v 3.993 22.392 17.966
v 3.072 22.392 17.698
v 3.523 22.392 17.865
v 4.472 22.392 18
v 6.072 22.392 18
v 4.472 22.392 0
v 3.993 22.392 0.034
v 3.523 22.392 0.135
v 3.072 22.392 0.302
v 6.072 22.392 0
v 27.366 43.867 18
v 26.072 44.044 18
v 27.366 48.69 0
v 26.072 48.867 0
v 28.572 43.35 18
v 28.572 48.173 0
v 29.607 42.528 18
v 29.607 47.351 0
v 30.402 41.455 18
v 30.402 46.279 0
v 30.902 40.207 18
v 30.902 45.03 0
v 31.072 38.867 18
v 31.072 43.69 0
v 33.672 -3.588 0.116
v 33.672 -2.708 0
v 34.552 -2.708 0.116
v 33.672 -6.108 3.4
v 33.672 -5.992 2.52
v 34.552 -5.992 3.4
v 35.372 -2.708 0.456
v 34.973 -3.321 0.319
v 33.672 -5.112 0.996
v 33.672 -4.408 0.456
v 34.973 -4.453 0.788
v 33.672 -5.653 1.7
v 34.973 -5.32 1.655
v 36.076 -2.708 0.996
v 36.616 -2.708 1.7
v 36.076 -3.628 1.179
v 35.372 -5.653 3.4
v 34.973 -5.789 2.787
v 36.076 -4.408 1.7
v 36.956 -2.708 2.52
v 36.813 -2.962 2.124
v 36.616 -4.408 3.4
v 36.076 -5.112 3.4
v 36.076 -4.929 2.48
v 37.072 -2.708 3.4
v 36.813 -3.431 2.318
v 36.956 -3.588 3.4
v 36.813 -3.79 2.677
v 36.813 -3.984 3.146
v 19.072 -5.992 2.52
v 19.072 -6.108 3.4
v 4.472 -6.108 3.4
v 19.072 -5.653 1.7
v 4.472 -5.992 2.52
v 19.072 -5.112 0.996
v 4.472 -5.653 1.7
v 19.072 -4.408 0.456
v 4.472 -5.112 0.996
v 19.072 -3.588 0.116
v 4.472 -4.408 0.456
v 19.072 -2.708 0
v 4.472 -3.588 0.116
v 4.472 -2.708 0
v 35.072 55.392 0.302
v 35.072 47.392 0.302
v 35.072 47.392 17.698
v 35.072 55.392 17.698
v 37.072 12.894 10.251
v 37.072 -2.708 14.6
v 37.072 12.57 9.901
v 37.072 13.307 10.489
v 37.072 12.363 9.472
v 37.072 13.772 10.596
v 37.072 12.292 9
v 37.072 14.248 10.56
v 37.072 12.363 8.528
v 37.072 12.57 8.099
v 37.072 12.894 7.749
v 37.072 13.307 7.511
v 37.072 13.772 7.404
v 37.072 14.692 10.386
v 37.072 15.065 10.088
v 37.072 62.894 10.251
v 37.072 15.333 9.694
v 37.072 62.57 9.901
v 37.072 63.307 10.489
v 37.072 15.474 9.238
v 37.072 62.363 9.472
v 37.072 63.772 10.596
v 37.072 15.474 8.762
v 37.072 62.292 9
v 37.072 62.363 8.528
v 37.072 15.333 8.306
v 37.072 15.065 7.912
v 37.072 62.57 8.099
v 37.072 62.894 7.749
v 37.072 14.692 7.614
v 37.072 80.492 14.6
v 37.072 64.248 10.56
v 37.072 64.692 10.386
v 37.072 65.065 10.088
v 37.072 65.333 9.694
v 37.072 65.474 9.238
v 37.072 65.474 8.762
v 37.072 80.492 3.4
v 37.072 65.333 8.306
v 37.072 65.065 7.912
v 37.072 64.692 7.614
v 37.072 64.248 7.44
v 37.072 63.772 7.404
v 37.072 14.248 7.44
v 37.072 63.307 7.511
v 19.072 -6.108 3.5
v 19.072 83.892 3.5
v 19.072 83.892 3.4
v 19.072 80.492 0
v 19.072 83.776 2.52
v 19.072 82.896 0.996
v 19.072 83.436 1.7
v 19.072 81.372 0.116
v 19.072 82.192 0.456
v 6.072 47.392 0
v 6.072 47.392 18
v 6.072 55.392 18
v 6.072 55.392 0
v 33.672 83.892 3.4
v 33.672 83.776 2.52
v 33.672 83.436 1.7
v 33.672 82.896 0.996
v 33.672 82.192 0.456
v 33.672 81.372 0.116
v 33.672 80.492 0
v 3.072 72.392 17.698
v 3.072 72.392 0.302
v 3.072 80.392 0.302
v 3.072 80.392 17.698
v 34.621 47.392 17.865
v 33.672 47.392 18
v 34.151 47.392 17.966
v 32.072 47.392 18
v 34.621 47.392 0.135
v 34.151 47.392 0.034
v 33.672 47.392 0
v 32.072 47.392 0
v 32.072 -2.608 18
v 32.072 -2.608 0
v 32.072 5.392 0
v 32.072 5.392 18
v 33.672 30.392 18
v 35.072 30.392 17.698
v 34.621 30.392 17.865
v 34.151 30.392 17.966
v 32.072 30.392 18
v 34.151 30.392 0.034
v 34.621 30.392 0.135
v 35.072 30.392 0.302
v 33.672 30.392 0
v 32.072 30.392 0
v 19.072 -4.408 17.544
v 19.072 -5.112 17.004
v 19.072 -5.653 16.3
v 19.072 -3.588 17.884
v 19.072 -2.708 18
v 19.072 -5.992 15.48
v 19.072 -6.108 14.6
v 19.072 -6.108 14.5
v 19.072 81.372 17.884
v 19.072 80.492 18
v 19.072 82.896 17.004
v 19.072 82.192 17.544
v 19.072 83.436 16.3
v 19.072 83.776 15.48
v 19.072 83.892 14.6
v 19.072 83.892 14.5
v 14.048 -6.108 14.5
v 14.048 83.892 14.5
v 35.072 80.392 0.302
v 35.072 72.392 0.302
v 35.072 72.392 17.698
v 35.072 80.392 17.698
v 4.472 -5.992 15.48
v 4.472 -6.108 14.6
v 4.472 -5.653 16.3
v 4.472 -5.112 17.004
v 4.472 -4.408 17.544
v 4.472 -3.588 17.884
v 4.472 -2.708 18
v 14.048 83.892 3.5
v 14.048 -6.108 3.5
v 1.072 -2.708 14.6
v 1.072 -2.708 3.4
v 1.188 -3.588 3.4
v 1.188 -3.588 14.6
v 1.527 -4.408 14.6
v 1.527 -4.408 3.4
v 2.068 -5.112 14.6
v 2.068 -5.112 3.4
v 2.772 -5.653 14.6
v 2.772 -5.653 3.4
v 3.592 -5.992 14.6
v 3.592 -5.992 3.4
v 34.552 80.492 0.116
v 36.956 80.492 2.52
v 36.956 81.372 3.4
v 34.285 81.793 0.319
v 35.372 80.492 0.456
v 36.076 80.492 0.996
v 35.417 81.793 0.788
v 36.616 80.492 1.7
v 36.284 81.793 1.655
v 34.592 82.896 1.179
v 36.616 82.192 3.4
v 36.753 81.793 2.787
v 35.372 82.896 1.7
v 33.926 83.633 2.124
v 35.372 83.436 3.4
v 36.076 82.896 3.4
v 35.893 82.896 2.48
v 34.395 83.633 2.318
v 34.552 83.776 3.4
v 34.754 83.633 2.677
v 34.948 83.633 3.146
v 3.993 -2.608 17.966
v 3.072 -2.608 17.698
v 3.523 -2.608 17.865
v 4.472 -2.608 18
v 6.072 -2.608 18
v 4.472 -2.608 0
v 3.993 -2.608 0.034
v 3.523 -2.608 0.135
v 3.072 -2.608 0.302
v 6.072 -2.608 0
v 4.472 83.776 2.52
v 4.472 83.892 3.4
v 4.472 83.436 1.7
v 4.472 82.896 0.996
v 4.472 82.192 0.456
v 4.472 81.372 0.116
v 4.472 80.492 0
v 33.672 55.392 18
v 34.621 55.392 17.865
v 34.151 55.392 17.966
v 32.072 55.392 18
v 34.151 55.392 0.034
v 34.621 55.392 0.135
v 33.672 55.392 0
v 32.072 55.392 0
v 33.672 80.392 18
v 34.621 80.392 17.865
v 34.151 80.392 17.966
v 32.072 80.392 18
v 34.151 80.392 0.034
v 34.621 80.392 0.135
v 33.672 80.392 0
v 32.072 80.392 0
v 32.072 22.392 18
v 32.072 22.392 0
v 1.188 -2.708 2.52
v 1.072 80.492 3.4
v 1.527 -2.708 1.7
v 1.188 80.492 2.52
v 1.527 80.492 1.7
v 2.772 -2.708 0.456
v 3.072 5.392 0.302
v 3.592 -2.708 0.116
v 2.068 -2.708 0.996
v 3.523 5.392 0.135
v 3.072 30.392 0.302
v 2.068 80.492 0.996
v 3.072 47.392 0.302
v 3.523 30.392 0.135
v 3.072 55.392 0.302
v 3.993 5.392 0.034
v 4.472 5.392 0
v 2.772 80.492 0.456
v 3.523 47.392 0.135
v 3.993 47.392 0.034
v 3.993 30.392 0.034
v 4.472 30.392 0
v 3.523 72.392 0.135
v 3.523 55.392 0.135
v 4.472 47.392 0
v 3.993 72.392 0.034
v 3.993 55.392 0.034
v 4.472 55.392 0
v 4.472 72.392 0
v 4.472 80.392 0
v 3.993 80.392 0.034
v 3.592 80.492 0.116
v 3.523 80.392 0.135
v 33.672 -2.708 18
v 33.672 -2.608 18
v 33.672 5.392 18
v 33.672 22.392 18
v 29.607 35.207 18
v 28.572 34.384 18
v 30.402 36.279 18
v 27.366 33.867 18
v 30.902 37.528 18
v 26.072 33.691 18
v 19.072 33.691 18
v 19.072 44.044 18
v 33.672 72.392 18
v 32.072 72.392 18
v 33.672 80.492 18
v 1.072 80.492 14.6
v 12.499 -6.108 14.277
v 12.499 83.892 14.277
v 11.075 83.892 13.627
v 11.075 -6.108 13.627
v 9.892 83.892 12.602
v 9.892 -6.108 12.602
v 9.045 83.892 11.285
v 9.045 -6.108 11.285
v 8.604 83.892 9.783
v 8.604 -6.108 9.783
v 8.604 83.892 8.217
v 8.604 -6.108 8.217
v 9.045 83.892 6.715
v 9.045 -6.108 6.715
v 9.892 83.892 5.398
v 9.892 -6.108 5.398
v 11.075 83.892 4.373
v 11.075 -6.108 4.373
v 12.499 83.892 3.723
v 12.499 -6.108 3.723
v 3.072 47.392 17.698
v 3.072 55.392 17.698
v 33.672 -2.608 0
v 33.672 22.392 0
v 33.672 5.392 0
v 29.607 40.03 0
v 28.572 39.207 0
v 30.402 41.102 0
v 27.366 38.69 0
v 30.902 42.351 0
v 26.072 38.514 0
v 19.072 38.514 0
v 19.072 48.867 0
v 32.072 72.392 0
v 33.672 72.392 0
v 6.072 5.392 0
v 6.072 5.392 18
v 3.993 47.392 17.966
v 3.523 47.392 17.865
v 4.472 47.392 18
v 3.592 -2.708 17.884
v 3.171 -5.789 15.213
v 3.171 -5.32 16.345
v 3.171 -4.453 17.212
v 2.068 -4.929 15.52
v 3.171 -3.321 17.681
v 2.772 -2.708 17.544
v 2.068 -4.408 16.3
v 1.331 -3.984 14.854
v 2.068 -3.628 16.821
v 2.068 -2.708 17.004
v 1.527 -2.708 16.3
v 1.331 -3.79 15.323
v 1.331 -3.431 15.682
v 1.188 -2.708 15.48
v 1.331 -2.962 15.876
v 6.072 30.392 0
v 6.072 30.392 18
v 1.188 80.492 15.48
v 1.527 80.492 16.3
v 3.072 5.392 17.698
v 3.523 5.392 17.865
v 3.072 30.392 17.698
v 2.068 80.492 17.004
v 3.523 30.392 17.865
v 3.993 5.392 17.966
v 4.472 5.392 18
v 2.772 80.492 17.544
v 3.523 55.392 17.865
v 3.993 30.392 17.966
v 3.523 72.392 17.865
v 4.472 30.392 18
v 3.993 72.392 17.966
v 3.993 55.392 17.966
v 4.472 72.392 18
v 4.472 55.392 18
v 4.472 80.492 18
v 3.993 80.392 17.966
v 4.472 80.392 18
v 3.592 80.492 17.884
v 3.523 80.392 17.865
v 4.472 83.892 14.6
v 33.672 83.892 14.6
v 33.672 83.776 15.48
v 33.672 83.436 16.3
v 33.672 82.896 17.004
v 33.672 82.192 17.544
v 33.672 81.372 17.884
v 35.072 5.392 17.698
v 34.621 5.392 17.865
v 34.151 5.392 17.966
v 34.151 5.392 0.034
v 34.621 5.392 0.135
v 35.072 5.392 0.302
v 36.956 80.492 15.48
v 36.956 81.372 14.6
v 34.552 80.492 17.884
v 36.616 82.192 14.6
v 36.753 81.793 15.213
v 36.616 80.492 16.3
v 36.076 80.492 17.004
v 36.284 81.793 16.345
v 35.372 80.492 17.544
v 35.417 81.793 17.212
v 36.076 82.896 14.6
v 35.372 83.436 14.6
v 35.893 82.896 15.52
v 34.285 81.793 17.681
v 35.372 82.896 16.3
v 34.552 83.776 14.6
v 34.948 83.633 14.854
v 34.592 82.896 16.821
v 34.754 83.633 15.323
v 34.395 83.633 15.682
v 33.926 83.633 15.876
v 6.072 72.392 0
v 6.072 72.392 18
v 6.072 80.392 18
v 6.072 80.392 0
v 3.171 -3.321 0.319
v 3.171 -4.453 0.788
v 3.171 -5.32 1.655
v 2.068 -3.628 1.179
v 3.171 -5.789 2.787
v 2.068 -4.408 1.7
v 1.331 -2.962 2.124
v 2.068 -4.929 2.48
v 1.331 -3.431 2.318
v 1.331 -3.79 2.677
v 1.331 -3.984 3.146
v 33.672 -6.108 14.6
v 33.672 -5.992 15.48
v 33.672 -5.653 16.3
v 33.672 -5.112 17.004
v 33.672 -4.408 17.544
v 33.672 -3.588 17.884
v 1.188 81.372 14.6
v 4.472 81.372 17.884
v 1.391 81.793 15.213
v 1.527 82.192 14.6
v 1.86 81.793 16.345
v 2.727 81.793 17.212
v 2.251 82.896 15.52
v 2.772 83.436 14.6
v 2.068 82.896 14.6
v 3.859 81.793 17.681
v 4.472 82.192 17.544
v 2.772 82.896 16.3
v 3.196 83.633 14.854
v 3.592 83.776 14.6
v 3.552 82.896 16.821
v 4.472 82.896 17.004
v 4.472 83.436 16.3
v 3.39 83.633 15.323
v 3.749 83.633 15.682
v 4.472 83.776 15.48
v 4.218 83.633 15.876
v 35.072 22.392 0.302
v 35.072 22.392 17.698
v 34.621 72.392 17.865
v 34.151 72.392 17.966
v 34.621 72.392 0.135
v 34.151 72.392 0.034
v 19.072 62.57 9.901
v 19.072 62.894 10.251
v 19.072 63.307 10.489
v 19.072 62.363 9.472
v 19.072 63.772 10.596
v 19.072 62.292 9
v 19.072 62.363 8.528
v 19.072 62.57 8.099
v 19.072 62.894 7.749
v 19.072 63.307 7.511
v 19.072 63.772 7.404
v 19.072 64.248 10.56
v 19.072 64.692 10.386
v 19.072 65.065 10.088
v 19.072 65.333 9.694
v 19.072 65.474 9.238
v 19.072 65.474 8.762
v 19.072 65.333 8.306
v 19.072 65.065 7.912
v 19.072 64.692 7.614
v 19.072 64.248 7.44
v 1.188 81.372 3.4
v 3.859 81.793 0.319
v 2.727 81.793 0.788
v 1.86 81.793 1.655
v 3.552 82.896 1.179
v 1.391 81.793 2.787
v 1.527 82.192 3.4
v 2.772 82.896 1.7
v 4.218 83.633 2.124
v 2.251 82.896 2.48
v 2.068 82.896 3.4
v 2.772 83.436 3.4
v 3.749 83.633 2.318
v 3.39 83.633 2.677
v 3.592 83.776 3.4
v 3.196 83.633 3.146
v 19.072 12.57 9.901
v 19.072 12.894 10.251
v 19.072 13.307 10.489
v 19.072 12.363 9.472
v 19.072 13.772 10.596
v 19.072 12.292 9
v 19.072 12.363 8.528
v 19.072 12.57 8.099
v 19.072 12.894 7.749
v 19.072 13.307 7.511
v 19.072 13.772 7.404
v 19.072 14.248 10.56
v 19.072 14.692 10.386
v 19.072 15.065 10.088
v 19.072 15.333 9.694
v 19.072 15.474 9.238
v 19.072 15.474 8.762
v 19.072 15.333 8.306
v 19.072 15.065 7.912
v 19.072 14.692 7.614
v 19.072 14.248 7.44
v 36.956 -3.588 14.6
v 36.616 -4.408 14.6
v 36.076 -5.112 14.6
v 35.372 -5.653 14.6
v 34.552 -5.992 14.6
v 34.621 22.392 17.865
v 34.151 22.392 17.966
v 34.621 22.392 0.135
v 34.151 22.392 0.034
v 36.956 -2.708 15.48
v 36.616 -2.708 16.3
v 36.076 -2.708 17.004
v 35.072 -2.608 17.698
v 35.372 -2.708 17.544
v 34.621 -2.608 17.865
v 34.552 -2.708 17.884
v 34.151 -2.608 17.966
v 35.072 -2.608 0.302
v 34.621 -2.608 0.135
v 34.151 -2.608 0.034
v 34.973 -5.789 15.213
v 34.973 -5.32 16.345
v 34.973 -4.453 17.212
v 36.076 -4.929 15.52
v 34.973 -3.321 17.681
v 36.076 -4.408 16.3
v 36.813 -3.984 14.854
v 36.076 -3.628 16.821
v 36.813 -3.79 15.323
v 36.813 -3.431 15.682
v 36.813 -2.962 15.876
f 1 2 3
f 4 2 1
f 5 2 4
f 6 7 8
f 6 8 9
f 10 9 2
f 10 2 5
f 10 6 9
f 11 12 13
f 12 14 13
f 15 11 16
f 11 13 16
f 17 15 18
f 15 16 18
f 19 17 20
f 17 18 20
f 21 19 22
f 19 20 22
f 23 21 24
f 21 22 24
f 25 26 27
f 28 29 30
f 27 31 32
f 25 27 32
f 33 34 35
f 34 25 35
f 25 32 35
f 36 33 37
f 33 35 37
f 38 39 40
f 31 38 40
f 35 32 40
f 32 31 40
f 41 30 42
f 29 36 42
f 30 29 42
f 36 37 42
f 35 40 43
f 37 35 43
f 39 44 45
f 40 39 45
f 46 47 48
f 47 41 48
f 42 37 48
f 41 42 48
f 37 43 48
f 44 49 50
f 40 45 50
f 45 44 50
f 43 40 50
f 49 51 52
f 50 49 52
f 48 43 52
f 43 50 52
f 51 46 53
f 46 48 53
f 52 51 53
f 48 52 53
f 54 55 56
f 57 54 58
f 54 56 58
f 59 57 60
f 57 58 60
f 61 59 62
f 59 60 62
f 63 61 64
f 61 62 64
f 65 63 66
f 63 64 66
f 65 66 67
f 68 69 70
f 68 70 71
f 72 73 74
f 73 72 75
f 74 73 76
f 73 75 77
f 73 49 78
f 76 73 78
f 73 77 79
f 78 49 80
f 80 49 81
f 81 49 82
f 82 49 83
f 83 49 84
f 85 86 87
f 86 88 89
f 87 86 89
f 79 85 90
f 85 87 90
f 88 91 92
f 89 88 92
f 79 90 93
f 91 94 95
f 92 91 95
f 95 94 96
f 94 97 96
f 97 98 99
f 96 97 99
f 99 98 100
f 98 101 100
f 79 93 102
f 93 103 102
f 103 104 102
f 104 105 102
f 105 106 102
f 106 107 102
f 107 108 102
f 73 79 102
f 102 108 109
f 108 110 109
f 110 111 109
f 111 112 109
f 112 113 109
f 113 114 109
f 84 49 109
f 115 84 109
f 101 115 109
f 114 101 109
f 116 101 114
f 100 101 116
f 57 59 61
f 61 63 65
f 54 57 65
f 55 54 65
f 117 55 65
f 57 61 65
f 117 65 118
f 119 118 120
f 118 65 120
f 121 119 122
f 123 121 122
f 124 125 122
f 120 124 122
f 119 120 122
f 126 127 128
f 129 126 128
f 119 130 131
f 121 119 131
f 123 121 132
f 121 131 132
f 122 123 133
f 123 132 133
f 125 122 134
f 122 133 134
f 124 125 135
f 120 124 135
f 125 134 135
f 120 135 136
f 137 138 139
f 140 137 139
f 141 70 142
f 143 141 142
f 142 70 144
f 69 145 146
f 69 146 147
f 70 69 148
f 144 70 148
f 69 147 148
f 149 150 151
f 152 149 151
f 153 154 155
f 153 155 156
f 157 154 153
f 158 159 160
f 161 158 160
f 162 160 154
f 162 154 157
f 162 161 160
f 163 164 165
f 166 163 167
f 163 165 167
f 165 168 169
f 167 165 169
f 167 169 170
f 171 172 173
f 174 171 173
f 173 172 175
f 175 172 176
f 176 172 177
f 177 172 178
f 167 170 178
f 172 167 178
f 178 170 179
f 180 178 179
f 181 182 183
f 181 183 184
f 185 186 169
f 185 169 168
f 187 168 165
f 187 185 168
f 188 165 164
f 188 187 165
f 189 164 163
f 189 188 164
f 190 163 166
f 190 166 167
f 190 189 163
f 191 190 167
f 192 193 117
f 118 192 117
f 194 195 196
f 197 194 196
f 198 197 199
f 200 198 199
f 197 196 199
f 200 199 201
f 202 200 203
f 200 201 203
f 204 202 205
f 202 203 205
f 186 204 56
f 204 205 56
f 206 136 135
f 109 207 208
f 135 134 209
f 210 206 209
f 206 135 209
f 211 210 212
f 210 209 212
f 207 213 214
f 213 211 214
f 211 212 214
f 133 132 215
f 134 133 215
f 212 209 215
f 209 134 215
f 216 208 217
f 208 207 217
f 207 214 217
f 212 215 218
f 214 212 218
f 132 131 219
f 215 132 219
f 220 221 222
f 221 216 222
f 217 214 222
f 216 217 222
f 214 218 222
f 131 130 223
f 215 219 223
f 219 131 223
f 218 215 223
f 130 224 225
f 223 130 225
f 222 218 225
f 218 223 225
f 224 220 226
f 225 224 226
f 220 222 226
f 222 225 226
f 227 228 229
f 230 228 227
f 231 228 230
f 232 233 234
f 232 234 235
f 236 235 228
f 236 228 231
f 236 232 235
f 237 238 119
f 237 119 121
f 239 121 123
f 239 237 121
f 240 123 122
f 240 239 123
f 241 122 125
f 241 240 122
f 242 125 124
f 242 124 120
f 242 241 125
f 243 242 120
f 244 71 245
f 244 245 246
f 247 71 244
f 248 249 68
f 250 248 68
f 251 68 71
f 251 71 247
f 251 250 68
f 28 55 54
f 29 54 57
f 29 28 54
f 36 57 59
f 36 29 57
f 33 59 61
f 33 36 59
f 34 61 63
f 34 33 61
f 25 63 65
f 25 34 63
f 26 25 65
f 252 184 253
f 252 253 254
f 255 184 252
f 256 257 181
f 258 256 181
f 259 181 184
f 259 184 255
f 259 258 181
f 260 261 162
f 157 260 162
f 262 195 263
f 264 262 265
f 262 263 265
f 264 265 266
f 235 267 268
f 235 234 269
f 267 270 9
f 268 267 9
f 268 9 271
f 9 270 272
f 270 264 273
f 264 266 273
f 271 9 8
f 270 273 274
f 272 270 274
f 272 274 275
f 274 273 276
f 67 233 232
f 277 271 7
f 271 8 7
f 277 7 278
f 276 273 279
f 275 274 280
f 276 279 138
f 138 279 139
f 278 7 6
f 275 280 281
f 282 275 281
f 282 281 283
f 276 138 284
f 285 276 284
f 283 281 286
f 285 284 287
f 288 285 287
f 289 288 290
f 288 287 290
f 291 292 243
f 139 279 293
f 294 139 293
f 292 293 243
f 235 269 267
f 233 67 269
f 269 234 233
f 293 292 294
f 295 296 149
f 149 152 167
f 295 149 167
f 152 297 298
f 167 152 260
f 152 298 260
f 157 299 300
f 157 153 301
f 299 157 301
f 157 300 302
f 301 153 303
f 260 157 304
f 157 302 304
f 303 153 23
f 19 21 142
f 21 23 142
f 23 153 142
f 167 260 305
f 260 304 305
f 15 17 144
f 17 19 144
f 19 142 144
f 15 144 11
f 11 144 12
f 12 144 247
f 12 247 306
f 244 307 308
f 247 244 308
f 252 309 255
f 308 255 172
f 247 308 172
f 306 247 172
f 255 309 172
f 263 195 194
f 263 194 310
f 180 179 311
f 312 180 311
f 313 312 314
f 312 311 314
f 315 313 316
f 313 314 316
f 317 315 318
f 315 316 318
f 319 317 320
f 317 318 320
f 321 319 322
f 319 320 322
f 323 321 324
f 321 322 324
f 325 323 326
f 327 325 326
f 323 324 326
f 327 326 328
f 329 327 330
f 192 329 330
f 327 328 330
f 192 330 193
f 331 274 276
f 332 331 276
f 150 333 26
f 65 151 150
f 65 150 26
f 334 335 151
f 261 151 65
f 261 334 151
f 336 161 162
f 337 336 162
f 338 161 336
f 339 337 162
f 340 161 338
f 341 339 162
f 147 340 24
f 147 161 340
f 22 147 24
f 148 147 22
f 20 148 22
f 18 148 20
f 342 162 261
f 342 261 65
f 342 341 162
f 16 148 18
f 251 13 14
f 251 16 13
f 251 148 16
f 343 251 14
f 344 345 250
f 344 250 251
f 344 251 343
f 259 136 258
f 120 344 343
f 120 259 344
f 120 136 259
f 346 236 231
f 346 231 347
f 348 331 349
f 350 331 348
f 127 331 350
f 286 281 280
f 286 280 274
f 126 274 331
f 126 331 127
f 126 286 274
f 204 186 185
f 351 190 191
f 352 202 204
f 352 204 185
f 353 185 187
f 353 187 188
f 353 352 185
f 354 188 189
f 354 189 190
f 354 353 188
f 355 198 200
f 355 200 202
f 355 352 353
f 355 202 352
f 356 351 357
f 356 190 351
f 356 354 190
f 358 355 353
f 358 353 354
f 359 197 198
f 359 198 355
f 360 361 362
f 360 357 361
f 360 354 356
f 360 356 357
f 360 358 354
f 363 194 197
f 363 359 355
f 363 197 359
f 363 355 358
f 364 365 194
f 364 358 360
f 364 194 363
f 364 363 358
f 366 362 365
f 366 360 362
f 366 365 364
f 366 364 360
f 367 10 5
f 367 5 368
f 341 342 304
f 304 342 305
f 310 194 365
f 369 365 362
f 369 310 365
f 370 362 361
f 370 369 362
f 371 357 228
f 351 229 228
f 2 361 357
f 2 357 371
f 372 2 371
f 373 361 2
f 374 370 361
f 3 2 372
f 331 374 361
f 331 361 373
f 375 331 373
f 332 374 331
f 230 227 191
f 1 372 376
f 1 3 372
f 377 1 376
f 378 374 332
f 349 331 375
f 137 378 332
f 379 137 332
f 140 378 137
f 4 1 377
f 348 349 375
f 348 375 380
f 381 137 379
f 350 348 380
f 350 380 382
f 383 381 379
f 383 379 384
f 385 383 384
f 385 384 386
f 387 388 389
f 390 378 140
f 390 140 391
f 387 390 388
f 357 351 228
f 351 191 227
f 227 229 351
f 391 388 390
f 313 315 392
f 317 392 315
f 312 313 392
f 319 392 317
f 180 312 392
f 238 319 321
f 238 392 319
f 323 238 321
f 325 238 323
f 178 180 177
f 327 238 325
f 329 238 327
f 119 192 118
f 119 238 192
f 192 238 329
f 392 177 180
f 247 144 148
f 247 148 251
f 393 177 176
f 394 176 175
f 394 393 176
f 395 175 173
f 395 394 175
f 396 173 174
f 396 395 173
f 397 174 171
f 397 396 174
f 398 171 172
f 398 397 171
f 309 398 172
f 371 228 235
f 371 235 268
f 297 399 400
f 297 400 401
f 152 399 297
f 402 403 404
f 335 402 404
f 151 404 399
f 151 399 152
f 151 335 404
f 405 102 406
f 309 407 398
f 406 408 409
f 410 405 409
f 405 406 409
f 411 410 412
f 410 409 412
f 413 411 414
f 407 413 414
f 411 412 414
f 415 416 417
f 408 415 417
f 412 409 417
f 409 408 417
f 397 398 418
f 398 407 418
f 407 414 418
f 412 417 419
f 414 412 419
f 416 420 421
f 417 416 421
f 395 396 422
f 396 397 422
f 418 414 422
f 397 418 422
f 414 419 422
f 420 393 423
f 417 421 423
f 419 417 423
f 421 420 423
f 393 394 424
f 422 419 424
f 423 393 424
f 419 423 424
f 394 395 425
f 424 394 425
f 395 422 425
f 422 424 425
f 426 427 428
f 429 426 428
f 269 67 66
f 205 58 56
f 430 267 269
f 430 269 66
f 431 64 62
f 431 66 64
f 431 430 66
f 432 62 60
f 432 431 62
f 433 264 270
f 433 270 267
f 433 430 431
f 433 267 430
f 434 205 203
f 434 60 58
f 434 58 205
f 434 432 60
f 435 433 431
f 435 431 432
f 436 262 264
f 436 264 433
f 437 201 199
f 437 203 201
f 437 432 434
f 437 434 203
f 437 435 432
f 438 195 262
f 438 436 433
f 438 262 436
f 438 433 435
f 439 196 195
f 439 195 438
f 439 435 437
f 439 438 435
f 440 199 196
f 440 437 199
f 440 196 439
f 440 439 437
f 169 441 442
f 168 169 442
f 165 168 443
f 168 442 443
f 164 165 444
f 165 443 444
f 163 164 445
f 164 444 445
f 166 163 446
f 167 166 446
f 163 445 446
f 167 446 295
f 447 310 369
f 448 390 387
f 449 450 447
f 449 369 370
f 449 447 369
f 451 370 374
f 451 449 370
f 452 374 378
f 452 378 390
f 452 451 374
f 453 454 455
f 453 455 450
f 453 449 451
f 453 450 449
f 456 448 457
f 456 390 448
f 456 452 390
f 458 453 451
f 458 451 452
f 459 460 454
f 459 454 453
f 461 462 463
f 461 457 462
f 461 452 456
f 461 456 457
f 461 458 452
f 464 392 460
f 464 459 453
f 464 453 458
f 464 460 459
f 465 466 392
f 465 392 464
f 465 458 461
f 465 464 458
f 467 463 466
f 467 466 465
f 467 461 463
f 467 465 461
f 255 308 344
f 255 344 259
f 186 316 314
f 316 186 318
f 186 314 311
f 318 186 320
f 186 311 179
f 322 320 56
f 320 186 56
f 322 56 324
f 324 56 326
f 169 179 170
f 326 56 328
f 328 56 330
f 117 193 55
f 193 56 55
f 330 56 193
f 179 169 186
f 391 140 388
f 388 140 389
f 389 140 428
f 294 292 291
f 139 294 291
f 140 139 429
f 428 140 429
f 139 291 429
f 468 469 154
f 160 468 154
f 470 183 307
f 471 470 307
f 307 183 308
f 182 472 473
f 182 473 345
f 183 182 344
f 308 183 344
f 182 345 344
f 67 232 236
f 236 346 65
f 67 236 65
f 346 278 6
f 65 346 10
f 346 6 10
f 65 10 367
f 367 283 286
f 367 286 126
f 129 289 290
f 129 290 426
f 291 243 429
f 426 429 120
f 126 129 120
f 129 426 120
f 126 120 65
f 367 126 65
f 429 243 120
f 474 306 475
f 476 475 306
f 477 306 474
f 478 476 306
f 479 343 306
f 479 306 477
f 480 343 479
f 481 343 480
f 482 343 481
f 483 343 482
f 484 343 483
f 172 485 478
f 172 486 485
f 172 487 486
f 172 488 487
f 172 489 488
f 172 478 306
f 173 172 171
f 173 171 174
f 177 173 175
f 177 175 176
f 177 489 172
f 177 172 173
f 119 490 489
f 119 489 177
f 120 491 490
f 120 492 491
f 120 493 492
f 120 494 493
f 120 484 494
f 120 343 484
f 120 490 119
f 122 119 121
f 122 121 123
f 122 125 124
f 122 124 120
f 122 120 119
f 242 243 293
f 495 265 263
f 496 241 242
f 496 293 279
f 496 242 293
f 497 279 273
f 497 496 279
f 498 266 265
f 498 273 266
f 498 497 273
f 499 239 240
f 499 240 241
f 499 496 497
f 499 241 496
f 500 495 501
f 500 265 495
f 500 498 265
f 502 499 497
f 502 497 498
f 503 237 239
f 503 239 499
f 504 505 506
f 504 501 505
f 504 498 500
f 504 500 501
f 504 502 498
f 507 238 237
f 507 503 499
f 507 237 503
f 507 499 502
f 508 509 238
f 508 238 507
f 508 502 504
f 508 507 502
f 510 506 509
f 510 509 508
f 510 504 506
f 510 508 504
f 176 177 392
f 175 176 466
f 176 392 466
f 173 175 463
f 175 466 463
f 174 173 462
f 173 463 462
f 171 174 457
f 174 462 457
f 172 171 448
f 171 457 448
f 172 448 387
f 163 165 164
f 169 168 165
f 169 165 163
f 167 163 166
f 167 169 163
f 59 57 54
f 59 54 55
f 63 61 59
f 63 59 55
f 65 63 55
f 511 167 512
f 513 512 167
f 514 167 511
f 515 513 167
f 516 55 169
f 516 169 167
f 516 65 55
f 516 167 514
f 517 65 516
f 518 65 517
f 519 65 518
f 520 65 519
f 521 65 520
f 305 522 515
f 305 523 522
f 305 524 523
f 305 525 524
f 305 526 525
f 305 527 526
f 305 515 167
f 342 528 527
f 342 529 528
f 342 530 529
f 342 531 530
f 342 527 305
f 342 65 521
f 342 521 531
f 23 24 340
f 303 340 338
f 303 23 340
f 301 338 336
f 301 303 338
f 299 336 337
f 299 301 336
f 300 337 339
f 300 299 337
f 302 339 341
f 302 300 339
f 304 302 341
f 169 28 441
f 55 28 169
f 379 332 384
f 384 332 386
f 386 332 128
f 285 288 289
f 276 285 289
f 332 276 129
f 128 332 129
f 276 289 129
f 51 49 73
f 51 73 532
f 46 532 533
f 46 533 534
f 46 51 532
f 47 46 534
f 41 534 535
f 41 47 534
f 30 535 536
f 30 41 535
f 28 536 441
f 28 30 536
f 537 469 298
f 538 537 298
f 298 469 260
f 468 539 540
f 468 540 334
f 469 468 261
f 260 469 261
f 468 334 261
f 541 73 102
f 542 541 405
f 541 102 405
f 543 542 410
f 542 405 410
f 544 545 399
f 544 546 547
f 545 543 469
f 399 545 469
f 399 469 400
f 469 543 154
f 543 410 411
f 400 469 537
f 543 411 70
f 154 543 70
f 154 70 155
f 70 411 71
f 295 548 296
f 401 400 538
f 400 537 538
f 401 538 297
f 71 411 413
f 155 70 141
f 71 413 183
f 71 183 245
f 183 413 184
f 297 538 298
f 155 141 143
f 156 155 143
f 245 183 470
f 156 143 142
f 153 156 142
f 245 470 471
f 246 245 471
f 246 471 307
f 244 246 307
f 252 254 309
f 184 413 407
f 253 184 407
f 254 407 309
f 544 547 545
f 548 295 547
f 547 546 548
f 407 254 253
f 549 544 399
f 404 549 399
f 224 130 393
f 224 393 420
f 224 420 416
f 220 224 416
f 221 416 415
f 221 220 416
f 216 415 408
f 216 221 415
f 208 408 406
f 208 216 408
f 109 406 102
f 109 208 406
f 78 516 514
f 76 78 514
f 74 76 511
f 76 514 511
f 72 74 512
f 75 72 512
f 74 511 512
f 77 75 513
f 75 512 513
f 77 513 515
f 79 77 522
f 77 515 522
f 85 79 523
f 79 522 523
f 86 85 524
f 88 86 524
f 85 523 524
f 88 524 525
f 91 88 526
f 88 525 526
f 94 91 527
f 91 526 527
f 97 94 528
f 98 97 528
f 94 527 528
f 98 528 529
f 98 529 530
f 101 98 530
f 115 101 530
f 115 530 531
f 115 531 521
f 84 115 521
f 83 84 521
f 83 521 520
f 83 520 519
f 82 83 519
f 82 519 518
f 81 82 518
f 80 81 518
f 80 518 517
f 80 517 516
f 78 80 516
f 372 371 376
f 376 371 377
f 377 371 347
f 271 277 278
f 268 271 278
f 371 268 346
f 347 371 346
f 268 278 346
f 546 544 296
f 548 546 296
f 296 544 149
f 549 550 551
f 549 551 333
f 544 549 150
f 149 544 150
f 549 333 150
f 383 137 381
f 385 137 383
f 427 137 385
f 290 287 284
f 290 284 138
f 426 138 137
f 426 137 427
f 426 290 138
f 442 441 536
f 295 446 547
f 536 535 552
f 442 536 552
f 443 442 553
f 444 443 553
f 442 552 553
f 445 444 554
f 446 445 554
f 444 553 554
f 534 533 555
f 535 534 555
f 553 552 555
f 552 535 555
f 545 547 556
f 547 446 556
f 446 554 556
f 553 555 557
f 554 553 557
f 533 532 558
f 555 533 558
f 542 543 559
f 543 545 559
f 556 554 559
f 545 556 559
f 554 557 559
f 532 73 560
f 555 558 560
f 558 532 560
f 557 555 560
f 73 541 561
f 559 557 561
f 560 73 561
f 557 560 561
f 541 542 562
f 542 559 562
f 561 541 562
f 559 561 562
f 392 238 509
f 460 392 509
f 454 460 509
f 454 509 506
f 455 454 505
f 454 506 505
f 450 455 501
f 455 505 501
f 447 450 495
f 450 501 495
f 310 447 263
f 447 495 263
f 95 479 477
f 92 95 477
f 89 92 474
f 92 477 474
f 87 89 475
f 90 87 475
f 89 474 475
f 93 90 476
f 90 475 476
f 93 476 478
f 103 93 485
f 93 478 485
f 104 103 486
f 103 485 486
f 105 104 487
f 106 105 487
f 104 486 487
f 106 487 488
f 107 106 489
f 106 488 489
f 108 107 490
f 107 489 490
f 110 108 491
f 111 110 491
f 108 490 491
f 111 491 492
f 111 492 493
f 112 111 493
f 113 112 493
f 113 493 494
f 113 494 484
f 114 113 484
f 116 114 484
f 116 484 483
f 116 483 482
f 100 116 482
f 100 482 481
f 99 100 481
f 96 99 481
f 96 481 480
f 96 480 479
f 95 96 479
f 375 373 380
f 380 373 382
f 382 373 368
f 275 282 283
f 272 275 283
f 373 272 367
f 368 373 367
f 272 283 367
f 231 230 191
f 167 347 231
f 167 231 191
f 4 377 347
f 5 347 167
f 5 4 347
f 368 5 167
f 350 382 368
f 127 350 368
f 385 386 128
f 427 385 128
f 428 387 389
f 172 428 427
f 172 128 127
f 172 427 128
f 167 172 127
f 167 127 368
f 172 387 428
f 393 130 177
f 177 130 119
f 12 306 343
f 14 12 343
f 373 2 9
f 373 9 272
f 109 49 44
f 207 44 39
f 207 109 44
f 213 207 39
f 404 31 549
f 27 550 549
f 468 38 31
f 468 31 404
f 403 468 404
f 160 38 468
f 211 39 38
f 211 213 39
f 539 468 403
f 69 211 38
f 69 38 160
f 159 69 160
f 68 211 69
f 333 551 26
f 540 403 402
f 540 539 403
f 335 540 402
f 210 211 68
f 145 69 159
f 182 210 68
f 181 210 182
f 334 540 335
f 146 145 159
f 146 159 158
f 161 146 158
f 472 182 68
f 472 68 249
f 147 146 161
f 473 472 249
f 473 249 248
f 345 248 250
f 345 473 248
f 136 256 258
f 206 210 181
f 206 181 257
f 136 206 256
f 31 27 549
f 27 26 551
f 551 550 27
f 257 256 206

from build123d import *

# Parameters (mm, degrees)
F0_W         = 18
F0_H         = 90
F0_W_2       = 3
F0_H_2       = 8
F1_DEPTH     = 18
F3_T1_DEPTH  = 23.1
F3_T3_DEPTH  = 83.2
F3_T5_DEPTH  = 11.2
F3_S9_W      = 3.4
F3_S9_H      = 3.4
F3_T10_DEPTH = 3.4
F3_S15_W     = 3.4
F3_S15_H     = 3.4
F3_T16_DEPTH = 3.4
F3_S21_W     = 3.4
F3_S21_H     = 3.4
F3_T22_DEPTH = 3.4
F3_S27_W     = 3.4
F3_S27_H     = 3.4
F3_T28_DEPTH = 3.4
F5_DEPTH     = 90.001
F7_DEPTH     = 12
F8_R         = 4.99999
F9_R         = 1.6
F10_DEPTH    = 18.001


# Not quite as in the source:
# - a fillet or chamfer that OpenCascade refuses, or shapes differently, is made with other operations: its cross-section is extruded or revolved along the edge and cut away or added
# - a fillet or chamfer is up to 0.001 mm smaller than in the source, because OpenCascade refuses the exact size


with BuildPart() as f1:
    # F0 (on Top) → F1 (new body)
    with BuildSketch(Plane.XY):
        with Locations((10.0719179884, 38.8917037249)):
            Rectangle(F0_W, F0_H)
        with Locations((4.5719179884, 1.3917037249)):
            Rectangle(F0_W_2, F0_H_2, mode=Mode.SUBTRACT)
        with Locations((4.5719179884, 26.3917037249)):
            Rectangle(F0_W_2, F0_H_2, mode=Mode.SUBTRACT)
        with Locations((4.5719179884, 51.3917037249)):
            Rectangle(F0_W_2, F0_H_2, mode=Mode.SUBTRACT)
        with Locations((4.5719179884, 76.3917037249)):
            Rectangle(F0_W_2, F0_H_2, mode=Mode.SUBTRACT)
    extrude(amount=F1_DEPTH)

    # F3: fillet of radius 3.4 on 8 edges, made by hand

    # F3_s2 → F3_t1 (cut)
    with BuildSketch(Plane.YZ.offset(4.4719179884)):
        with BuildLine():
            ThreePointArc((-6.1082962751, 14.6), (-5.1124593312, 17.004163056), (-2.7082962751, 18))
            Line((-2.7082962751, 18), (-6.1082962751, 18))
            Line((-6.1082962751, 18), (-6.1082962751, 14.6))
        make_face()
        with BuildLine():
            ThreePointArc((-6.1082962751, 3.4), (-5.1124593312, 0.995836944), (-2.7082962751, 0))
            Line((-2.7082962751, 0), (-6.1082962751, 0))
            Line((-6.1082962751, 0), (-6.1082962751, 3.4))
        make_face()
        with BuildLine():
            ThreePointArc((83.8917037249, 14.6), (82.8958667809, 17.004163056), (80.4917037249, 18))
            Line((80.4917037249, 18), (83.8917037249, 18))
            Line((83.8917037249, 18), (83.8917037249, 14.6))
        make_face()
        with BuildLine():
            ThreePointArc((83.8917037249, 3.4), (82.8958667809, 0.995836944), (80.4917037249, 0))
            Line((80.4917037249, 0), (83.8917037249, 0))
            Line((83.8917037249, 0), (83.8917037249, 3.4))
        make_face()
    extrude(amount=F3_T1_DEPTH, mode=Mode.SUBTRACT)

    # F3_s4 → F3_t3 (cut)
    with BuildSketch(Plane.XZ.offset(-80.4917037249)):
        with BuildLine():
            ThreePointArc((1.0719179884, 14.6), (2.0677549323, 17.004163056), (4.4719179884, 18))
            Line((4.4719179884, 18), (1.0719179884, 18))
            Line((1.0719179884, 18), (1.0719179884, 14.6))
        make_face()
        with BuildLine():
            ThreePointArc((1.0719179884, 3.4), (2.0677549323, 0.995836944), (4.4719179884, 0))
            Line((4.4719179884, 0), (1.0719179884, 0))
            Line((1.0719179884, 0), (1.0719179884, 3.4))
        make_face()
    extrude(amount=F3_T3_DEPTH, mode=Mode.SUBTRACT)

    # F3_s6 → F3_t5 (cut)
    with BuildSketch(Plane.XY.offset(3.4)):
        with BuildLine():
            ThreePointArc((1.0719179884, -2.7082962751), (2.0677549323, -5.1124593312), (4.4719179884, -6.1082962751))
            Line((4.4719179884, -6.1082962751), (1.0719179884, -6.1082962751))
            Line((1.0719179884, -6.1082962751), (1.0719179884, -2.7082962751))
        make_face()
        with BuildLine():
            ThreePointArc((4.4719179884, 83.8917037249), (2.0677549323, 82.8958667809), (1.0719179884, 80.4917037249))
            Line((1.0719179884, 80.4917037249), (1.0719179884, 83.8917037249))
            Line((1.0719179884, 83.8917037249), (4.4719179884, 83.8917037249))
        make_face()
    extrude(amount=F3_T5_DEPTH, mode=Mode.SUBTRACT)


with BuildPart() as f3_tool8:
    # F3_s9 → F3_t10 (new body)
    with BuildSketch(Plane.YZ.offset(4.4719179884)):
        with Locations((-4.4082962751, 16.3)):
            Rectangle(F3_S9_W, F3_S9_H)
    extrude(amount=-F3_T10_DEPTH)

    # F3_s11 → F3_t12 (revolve, cut)
    with BuildSketch(Plane(origin=(4.4719179884, -2.7082962751, 14.6), x_dir=(0, 0.7071067812, -0.7071067812), z_dir=(0, 0.7071067812, 0.7071067812))):
        with BuildLine():
            ThreePointArc((0, -3.4), (3.4, 0), (0, 3.4))
            Line((0, 3.4), (0, -3.4))
        make_face()
    revolve(axis=Axis((4.4719179884, -2.7082962751, 14.6), (-1, 0, 0)), mode=Mode.SUBTRACT)


with BuildPart() as f1_1:
    add(f1.part)

    # F3_t7: cut F3_tool8
    add(f3_tool8.part, mode=Mode.SUBTRACT)


with BuildPart() as f3_tool14:
    # F3_s15 → F3_t16 (new body)
    with BuildSketch(Plane.XZ.offset(-80.4917037249)):
        with Locations((2.7719179884, 16.3)):
            Rectangle(F3_S15_W, F3_S15_H)
    extrude(amount=-F3_T16_DEPTH)

    # F3_s17 → F3_t18 (revolve, cut)
    with BuildSketch(Plane(origin=(4.4719179884, 80.4917037249, 14.6), x_dir=(0.7071067812, 0, -0.7071067812), z_dir=(0.7071067812, 0, 0.7071067812))):
        with BuildLine():
            ThreePointArc((0, -3.4), (3.4, 0), (0, 3.4))
            Line((0, 3.4), (0, -3.4))
        make_face()
    revolve(axis=Axis((4.4719179884, 80.4917037249, 14.6), (0, 1, 0)), mode=Mode.SUBTRACT)


with BuildPart() as f1_2:
    add(f1_1.part)

    # F3_t13: cut F3_tool14
    add(f3_tool14.part, mode=Mode.SUBTRACT)


with BuildPart() as f3_tool20:
    # F3_s21 → F3_t22 (new body)
    with BuildSketch(Plane.YZ.offset(4.4719179884)):
        with Locations((-4.4082962751, 1.7)):
            Rectangle(F3_S21_W, F3_S21_H)
    extrude(amount=-F3_T22_DEPTH)

    # F3_s23 → F3_t24 (revolve, cut)
    with BuildSketch(Plane(origin=(4.4719179884, -2.7082962751, 3.4), x_dir=(0, 0.7071067812, 0.7071067812), z_dir=(0, -0.7071067812, 0.7071067812))):
        with BuildLine():
            ThreePointArc((0, -3.4), (3.4, 0), (0, 3.4))
            Line((0, 3.4), (0, -3.4))
        make_face()
    revolve(axis=Axis((4.4719179884, -2.7082962751, 3.4), (-1, 0, 0)), mode=Mode.SUBTRACT)


with BuildPart() as f1_3:
    add(f1_2.part)

    # F3_t19: cut F3_tool20
    add(f3_tool20.part, mode=Mode.SUBTRACT)


with BuildPart() as f3_tool26:
    # F3_s27 → F3_t28 (new body)
    with BuildSketch(Plane.XZ.offset(-80.4917037249)):
        with Locations((2.7719179884, 1.7)):
            Rectangle(F3_S27_W, F3_S27_H)
    extrude(amount=-F3_T28_DEPTH)

    # F3_s29 → F3_t30 (revolve, cut)
    with BuildSketch(Plane(origin=(4.4719179884, 80.4917037249, 3.4), x_dir=(0.7071067812, 0, 0.7071067812), z_dir=(-0.7071067812, 0, 0.7071067812))):
        with BuildLine():
            ThreePointArc((0, -3.4), (3.4, 0), (0, 3.4))
            Line((0, 3.4), (0, -3.4))
        make_face()
    revolve(axis=Axis((4.4719179884, 80.4917037249, 3.4), (0, 1, 0)), mode=Mode.SUBTRACT)


with BuildPart() as f1_4:
    add(f1_3.part)

    # F3_t25: cut F3_tool26
    add(f3_tool26.part, mode=Mode.SUBTRACT)


with BuildPart() as f4_1:
    # F4: instance of F1
    add(f1_4.part.mirror(Plane(origin=(19.0719179884, 38.8917037249, 9), x_dir=(0, 1, 0), z_dir=(1, 0, 0))))

    # F6 (on face) → F7 (cut)
    with BuildSketch(Plane(origin=(19.0719179884, 0, 0), x_dir=(0, -1, 0), z_dir=(-1, 0, 0))):
        Polygon((-39.876718396, -5.0858661007), (-32.9742111659, 20.6746415815), (-42.6334694288, 23.2628320326), (-49.5359766589, -2.4976756497), align=None)
    extrude(amount=-F7_DEPTH, mode=Mode.SUBTRACT)

    # F8 (radius 5 in the source; OpenCascade refuses exactly that, so slightly less here)
    f8_edges = [f4_1.edges().sort_by_distance(p)[0] for p in [
        (31.071918, 46.455184, 9),
        (31.071918, 36.102422, 9),
    ]]
    fillet(f8_edges, radius=F8_R)

    # F9 (on face) → F10 (cut, through all)
    with BuildSketch(Plane(origin=(19.0719179884, 0, 0), x_dir=(0, -1, 0), z_dir=(-1, 0, 0))):
        with Locations((-63.8917037249, 9)):
            Circle(F9_R)
        with Locations((-13.8917037249, 9)):
            Circle(F9_R)
    extrude(amount=-F10_DEPTH, mode=Mode.SUBTRACT)


with BuildPart() as f1_5:
    add(f1_4.part)

    # F2 (on face) → F5 (cut, through all)
    with BuildSketch(Plane.XZ.offset(6.1082962751)):
        with BuildLine():
            Line((19.0719179884, 6.7612328898), (19.0719179884, 11.2387671102))
            ThreePointArc((19.0719179884, 11.2387671102), (17.042909252, 13.613199492), (14.0481821448, 14.5))
            Line((14.0481821448, 14.5), (14.0481821448, 3.5))
            ThreePointArc((14.0481821448, 3.5), (17.042909252, 4.386800508), (19.0719179884, 6.7612328898))
        make_face()
        with BuildLine():
            ThreePointArc((14.0481821448, 14.5), (17.042909252, 13.613199492), (19.0719179884, 11.2387671102))
            Line((19.0719179884, 11.2387671102), (19.0719179884, 14.5))
            Line((19.0719179884, 14.5), (14.0481821448, 14.5))
        make_face()
        with BuildLine():
            Line((14.0481821448, 3.5), (14.0481821448, 14.5))
            ThreePointArc((14.0481821448, 14.5), (8.5481821448, 9), (14.0481821448, 3.5))
        make_face()
        with BuildLine():
            Line((19.0719179884, 3.5), (19.0719179884, 6.7612328898))
            ThreePointArc((19.0719179884, 6.7612328898), (17.042909252, 4.386800508), (14.0481821448, 3.5))
            Line((14.0481821448, 3.5), (19.0719179884, 3.5))
        make_face()
    extrude(amount=-F5_DEPTH, mode=Mode.SUBTRACT)


solid = Compound([f4_1.part, f1_5.part])
